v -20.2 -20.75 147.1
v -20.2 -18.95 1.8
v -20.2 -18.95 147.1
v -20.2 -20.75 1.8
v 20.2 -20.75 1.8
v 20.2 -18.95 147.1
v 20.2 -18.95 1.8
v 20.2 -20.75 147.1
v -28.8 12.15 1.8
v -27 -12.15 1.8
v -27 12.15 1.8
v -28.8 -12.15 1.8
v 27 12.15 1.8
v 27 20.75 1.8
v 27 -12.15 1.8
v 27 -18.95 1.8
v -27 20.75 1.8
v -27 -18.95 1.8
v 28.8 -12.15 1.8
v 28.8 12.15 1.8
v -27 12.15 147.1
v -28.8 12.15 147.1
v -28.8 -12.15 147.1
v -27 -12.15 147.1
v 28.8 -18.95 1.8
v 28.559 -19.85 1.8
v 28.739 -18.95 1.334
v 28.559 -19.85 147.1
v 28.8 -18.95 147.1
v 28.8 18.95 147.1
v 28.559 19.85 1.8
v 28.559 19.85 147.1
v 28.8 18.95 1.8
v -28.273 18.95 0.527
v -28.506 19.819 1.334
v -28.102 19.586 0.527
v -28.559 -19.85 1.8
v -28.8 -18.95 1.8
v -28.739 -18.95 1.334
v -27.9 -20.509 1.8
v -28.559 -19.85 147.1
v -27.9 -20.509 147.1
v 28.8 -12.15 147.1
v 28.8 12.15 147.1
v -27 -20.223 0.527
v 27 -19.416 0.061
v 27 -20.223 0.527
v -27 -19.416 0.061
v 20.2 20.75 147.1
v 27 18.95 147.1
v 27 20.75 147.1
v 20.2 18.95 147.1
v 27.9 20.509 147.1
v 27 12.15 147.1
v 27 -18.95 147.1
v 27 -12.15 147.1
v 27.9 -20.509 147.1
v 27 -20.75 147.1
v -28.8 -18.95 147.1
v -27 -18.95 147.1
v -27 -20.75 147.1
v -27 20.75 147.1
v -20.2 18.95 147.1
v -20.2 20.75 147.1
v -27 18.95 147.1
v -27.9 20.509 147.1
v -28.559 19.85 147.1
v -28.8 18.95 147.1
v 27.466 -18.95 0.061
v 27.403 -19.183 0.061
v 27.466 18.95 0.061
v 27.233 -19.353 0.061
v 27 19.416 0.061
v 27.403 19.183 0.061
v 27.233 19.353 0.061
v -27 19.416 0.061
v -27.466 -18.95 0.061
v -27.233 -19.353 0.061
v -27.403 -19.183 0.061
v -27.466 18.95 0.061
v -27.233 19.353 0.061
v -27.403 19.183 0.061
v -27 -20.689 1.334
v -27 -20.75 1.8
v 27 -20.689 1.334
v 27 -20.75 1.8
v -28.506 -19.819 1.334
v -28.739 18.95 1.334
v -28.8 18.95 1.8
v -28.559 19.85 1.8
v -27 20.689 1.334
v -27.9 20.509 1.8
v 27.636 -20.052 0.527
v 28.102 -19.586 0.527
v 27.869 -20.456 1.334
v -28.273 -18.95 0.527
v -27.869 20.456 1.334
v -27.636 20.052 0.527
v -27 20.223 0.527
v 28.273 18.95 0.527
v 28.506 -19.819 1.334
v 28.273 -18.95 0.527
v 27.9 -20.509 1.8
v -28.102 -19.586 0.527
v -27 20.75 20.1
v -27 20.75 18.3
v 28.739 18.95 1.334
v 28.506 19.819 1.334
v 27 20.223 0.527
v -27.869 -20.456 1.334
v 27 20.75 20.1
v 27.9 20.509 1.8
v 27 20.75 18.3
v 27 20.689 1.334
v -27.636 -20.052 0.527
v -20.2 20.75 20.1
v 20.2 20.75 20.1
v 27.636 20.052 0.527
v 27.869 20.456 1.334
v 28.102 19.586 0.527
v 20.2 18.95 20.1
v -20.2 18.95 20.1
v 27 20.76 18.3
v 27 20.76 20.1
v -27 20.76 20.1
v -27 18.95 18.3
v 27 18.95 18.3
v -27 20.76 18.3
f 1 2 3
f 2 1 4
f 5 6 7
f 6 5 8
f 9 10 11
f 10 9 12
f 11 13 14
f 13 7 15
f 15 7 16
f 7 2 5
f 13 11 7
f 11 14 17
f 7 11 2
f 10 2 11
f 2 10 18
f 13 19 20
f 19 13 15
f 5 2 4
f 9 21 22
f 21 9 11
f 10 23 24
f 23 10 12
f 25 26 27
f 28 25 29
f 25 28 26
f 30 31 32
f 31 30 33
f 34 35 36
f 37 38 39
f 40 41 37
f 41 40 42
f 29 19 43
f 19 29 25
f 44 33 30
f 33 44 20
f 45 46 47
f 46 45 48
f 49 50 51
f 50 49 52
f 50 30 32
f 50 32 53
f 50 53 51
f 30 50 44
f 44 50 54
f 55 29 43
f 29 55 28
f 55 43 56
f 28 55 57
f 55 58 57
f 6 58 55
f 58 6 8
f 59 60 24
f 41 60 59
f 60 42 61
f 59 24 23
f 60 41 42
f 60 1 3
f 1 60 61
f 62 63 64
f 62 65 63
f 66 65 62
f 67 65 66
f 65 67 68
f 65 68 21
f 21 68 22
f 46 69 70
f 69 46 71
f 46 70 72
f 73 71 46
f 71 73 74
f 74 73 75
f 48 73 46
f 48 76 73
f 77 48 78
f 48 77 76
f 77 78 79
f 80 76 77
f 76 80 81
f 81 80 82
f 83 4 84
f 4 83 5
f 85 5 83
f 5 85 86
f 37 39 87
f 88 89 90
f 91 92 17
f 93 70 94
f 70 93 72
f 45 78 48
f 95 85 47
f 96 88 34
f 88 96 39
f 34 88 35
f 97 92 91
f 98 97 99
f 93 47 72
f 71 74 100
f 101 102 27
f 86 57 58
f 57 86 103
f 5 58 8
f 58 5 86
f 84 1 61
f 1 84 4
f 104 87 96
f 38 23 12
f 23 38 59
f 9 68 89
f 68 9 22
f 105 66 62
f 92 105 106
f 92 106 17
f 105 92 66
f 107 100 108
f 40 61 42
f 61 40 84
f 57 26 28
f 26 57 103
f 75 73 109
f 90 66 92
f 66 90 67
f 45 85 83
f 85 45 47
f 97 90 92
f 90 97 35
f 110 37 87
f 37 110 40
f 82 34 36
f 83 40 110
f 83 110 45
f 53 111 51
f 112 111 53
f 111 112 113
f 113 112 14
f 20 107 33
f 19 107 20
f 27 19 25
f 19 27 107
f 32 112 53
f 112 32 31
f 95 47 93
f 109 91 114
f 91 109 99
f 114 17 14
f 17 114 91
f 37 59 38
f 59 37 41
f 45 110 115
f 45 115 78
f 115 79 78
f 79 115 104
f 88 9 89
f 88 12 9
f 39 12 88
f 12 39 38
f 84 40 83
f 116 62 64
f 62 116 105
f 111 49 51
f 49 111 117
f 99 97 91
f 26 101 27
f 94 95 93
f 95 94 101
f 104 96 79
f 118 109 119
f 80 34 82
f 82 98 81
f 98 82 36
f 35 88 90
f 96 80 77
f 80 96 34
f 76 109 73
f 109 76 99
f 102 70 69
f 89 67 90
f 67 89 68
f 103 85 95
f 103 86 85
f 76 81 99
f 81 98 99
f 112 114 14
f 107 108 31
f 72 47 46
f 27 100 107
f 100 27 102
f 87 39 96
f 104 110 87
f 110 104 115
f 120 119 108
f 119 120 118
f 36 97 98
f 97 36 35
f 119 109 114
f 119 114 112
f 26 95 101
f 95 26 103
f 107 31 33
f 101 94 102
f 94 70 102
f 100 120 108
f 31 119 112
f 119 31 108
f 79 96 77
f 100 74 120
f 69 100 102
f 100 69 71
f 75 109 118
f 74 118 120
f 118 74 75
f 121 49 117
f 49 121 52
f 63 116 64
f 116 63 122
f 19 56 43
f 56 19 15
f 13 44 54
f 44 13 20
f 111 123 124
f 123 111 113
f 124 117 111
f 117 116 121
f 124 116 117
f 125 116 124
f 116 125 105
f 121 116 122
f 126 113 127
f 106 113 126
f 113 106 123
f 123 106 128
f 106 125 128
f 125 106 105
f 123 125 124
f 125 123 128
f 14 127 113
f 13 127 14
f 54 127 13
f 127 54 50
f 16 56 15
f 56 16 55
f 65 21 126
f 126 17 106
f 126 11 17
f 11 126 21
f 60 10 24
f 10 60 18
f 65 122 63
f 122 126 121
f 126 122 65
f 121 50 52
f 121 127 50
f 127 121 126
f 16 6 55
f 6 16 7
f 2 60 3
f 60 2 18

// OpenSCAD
// -*- mode: SCAD ; c-file-style: "ellemtel" ; coding: utf-8 -*-
//
// matchbox stacker with or without a perch for the one box in use
//
// © 2018–2019 Roland Sieker <ospalh@gmail.com>
// Licence: CC-BY-SA 4.0

/* [Global] */

// Which variant of the stacker to create
variant = "s"; // [s: simple, p: with perch, c: with container]

// Set this to “render” and click on “Create Thing” when done with the setup.
preview = 1; // [0:render, 1:preview]

/* [Sizes] */

//
box_width = 53.2;  // [5:0.1:150]
box_hight = 16.1;  // [5:0.1:30]
box_depth = 37.1;  // [5:0.1:80]
boxes_per_pack = 10;  // [4:1:20]

/* [Hidden] */

// Done with the customizer

// *******************************************************
// Extra parameters. These can be changed reasonably safely.


w = 1.8;  // Wall width
// p = 1.2;  // Bottom, top plate hight
p = w;  // Bottom, top plate hight
c = 0.4;  // Clearance
angle = 60; // Overhangs much below 60° are a problem for me
k = 5;  // which of the remainig main plates
r_c = k/2;  // Radius of the main cuts
p_f = 0.5; // perch factor. How long the perch is as part of the width
c_f = 0.5;  // container factor. How long the perch is as part of the width
sp_w = 3.3; // How much the inner box is less wide than the outer
sp_h = 2.4; // How much the inner box is less high than the outer


// *******************************************************
// Some shortcuts. These shouldn’t be changed

tau = 2 * PI;  // π is still wrong. τ = circumference / r

xy_factor = 1/tan(angle);
// To get from a hight to a horizontal width inclined correctly
z_factor = tan(angle);  // The other way around

r_r = min(w,p);
w_e = box_width + 2*c;
d_e = box_depth + 2*c;
h_e = (boxes_per_pack - 1) * box_hight + c;


xe = w_e/2 + w - r_r;
ye = d_e/2 + w - r_r;

xex = xe - r_c - k;
yex = ye - r_c - k;



some_distance = 1.5 * box_width;
ms = 0.01;  // Muggeseggele.

h_ee = h_e + c + p + 2 * ms;
// fn for differently sized objects and fs, fa; all for preview or rendering.
pna = 40;
pnb = 15;
pa = 5;
ps = 1;
rna = 180;
rnb = 30;
ra = 2;
rs = 0.25;
function na() = (preview) ? pna : rna;
function nb() = (preview) ? pnb : rnb;
$fs = (preview) ? ps : rs;
$fa = (preview) ? pa : ra;

// *******************************************************
// End setup



// *******************************************************
// Generate the parts

print_part();
// preview_parts();
// stack_parts();

module print_part()
{
   if ("s" == variant)
   {
      simple_stacker();
   }
   if ("p" == variant)
   {
      stacker_with_perch();
   }
   if ("c" == variant)
   {
      stacker_with_container();
   }
}

module preview_parts()
{
   simple_stacker();
   translate([some_distance, 0, 0])
   {
      stacker_with_perch();
   }
   translate([0, some_distance, 0])
   {
      stacker_with_container();
   }
}


// *******************************************************
// Code for the parts themselves
module simple_stacker()
{
   difference()
   {
      union()
      {
         solid_main_box();
         single_matchbox_bar();
      }
      matches_hollow();
      single_matchbox_hole();
   }
}

module single_matchbox_bar()
{
   translate([-w_e/2, d_e/2-ms, p+box_hight+c])
   {
      cube([w_e,w+2*ms,w]);
   }
}

module single_matchbox_hole()
{
   translate([-w_e/2, d_e/2-ms, p])
   {
      cube([w_e,w+2*ms,+box_hight+c]);
   }
}

module matches_hollow()
{
   translate([0,0,h_ee/2+p])
   {
      cube([w_e, d_e, h_ee], center=true);
   }
}

module solid_main_box()
{
   difference()
   {
      simple_solid_box();
      x_cut();
      y_cut();
      rotate(180)
      {
         x_cut();
         y_cut();
      }
   }
   module x_cut()
   {
      hull()
      {
         translate([0,0,p])
         {
            translate([xex-w, yex+k, 0])
            {
               cylinder(r=r_c, h=h_ee);
            }
            translate([-xex+w, yex+k, 0])
            {
               cylinder(r=r_c, h=h_e + c + p+ 2 * ms);
            }
            translate([0, d_e, h_ee/2])
            {
               cube([2*xex-2*w+2*r_c, 1, h_ee], center=true);
            }
         }
      }
   }
   module y_cut()
   {
      hull()
      {
         translate([0,0,p])
         {
            translate([xex+k, yex-w, 0])
            {
               cylinder(r=r_c, h=h_ee);
            }
            translate([xex+k, -yex+w, 0])
            {
               cylinder(r=r_c, h=h_e + c + p+ 2 * ms);
            }
            translate([w_e, 0, h_ee/2])
            {
               cube([1, 2*yex-2*w+2*r_c, h_ee], center=true);
            }
         }
      }
   }
}

module simple_solid_box()
{
   hull()
   {
      translate([xe, ye,0])
      {
         stick();
      }
      translate([xe, -ye,0])
      {
         stick();
      }
      translate([-xe, ye,0])
      {
         stick();
      }
      translate([-xe, -ye,0])
      {
         stick();
      }
   }
   module stick()
   {
      translate([0,0,r_r])
      {
         sphere(r=r_r);
         cylinder(r=r_r, h_e);
      }
   }
}
